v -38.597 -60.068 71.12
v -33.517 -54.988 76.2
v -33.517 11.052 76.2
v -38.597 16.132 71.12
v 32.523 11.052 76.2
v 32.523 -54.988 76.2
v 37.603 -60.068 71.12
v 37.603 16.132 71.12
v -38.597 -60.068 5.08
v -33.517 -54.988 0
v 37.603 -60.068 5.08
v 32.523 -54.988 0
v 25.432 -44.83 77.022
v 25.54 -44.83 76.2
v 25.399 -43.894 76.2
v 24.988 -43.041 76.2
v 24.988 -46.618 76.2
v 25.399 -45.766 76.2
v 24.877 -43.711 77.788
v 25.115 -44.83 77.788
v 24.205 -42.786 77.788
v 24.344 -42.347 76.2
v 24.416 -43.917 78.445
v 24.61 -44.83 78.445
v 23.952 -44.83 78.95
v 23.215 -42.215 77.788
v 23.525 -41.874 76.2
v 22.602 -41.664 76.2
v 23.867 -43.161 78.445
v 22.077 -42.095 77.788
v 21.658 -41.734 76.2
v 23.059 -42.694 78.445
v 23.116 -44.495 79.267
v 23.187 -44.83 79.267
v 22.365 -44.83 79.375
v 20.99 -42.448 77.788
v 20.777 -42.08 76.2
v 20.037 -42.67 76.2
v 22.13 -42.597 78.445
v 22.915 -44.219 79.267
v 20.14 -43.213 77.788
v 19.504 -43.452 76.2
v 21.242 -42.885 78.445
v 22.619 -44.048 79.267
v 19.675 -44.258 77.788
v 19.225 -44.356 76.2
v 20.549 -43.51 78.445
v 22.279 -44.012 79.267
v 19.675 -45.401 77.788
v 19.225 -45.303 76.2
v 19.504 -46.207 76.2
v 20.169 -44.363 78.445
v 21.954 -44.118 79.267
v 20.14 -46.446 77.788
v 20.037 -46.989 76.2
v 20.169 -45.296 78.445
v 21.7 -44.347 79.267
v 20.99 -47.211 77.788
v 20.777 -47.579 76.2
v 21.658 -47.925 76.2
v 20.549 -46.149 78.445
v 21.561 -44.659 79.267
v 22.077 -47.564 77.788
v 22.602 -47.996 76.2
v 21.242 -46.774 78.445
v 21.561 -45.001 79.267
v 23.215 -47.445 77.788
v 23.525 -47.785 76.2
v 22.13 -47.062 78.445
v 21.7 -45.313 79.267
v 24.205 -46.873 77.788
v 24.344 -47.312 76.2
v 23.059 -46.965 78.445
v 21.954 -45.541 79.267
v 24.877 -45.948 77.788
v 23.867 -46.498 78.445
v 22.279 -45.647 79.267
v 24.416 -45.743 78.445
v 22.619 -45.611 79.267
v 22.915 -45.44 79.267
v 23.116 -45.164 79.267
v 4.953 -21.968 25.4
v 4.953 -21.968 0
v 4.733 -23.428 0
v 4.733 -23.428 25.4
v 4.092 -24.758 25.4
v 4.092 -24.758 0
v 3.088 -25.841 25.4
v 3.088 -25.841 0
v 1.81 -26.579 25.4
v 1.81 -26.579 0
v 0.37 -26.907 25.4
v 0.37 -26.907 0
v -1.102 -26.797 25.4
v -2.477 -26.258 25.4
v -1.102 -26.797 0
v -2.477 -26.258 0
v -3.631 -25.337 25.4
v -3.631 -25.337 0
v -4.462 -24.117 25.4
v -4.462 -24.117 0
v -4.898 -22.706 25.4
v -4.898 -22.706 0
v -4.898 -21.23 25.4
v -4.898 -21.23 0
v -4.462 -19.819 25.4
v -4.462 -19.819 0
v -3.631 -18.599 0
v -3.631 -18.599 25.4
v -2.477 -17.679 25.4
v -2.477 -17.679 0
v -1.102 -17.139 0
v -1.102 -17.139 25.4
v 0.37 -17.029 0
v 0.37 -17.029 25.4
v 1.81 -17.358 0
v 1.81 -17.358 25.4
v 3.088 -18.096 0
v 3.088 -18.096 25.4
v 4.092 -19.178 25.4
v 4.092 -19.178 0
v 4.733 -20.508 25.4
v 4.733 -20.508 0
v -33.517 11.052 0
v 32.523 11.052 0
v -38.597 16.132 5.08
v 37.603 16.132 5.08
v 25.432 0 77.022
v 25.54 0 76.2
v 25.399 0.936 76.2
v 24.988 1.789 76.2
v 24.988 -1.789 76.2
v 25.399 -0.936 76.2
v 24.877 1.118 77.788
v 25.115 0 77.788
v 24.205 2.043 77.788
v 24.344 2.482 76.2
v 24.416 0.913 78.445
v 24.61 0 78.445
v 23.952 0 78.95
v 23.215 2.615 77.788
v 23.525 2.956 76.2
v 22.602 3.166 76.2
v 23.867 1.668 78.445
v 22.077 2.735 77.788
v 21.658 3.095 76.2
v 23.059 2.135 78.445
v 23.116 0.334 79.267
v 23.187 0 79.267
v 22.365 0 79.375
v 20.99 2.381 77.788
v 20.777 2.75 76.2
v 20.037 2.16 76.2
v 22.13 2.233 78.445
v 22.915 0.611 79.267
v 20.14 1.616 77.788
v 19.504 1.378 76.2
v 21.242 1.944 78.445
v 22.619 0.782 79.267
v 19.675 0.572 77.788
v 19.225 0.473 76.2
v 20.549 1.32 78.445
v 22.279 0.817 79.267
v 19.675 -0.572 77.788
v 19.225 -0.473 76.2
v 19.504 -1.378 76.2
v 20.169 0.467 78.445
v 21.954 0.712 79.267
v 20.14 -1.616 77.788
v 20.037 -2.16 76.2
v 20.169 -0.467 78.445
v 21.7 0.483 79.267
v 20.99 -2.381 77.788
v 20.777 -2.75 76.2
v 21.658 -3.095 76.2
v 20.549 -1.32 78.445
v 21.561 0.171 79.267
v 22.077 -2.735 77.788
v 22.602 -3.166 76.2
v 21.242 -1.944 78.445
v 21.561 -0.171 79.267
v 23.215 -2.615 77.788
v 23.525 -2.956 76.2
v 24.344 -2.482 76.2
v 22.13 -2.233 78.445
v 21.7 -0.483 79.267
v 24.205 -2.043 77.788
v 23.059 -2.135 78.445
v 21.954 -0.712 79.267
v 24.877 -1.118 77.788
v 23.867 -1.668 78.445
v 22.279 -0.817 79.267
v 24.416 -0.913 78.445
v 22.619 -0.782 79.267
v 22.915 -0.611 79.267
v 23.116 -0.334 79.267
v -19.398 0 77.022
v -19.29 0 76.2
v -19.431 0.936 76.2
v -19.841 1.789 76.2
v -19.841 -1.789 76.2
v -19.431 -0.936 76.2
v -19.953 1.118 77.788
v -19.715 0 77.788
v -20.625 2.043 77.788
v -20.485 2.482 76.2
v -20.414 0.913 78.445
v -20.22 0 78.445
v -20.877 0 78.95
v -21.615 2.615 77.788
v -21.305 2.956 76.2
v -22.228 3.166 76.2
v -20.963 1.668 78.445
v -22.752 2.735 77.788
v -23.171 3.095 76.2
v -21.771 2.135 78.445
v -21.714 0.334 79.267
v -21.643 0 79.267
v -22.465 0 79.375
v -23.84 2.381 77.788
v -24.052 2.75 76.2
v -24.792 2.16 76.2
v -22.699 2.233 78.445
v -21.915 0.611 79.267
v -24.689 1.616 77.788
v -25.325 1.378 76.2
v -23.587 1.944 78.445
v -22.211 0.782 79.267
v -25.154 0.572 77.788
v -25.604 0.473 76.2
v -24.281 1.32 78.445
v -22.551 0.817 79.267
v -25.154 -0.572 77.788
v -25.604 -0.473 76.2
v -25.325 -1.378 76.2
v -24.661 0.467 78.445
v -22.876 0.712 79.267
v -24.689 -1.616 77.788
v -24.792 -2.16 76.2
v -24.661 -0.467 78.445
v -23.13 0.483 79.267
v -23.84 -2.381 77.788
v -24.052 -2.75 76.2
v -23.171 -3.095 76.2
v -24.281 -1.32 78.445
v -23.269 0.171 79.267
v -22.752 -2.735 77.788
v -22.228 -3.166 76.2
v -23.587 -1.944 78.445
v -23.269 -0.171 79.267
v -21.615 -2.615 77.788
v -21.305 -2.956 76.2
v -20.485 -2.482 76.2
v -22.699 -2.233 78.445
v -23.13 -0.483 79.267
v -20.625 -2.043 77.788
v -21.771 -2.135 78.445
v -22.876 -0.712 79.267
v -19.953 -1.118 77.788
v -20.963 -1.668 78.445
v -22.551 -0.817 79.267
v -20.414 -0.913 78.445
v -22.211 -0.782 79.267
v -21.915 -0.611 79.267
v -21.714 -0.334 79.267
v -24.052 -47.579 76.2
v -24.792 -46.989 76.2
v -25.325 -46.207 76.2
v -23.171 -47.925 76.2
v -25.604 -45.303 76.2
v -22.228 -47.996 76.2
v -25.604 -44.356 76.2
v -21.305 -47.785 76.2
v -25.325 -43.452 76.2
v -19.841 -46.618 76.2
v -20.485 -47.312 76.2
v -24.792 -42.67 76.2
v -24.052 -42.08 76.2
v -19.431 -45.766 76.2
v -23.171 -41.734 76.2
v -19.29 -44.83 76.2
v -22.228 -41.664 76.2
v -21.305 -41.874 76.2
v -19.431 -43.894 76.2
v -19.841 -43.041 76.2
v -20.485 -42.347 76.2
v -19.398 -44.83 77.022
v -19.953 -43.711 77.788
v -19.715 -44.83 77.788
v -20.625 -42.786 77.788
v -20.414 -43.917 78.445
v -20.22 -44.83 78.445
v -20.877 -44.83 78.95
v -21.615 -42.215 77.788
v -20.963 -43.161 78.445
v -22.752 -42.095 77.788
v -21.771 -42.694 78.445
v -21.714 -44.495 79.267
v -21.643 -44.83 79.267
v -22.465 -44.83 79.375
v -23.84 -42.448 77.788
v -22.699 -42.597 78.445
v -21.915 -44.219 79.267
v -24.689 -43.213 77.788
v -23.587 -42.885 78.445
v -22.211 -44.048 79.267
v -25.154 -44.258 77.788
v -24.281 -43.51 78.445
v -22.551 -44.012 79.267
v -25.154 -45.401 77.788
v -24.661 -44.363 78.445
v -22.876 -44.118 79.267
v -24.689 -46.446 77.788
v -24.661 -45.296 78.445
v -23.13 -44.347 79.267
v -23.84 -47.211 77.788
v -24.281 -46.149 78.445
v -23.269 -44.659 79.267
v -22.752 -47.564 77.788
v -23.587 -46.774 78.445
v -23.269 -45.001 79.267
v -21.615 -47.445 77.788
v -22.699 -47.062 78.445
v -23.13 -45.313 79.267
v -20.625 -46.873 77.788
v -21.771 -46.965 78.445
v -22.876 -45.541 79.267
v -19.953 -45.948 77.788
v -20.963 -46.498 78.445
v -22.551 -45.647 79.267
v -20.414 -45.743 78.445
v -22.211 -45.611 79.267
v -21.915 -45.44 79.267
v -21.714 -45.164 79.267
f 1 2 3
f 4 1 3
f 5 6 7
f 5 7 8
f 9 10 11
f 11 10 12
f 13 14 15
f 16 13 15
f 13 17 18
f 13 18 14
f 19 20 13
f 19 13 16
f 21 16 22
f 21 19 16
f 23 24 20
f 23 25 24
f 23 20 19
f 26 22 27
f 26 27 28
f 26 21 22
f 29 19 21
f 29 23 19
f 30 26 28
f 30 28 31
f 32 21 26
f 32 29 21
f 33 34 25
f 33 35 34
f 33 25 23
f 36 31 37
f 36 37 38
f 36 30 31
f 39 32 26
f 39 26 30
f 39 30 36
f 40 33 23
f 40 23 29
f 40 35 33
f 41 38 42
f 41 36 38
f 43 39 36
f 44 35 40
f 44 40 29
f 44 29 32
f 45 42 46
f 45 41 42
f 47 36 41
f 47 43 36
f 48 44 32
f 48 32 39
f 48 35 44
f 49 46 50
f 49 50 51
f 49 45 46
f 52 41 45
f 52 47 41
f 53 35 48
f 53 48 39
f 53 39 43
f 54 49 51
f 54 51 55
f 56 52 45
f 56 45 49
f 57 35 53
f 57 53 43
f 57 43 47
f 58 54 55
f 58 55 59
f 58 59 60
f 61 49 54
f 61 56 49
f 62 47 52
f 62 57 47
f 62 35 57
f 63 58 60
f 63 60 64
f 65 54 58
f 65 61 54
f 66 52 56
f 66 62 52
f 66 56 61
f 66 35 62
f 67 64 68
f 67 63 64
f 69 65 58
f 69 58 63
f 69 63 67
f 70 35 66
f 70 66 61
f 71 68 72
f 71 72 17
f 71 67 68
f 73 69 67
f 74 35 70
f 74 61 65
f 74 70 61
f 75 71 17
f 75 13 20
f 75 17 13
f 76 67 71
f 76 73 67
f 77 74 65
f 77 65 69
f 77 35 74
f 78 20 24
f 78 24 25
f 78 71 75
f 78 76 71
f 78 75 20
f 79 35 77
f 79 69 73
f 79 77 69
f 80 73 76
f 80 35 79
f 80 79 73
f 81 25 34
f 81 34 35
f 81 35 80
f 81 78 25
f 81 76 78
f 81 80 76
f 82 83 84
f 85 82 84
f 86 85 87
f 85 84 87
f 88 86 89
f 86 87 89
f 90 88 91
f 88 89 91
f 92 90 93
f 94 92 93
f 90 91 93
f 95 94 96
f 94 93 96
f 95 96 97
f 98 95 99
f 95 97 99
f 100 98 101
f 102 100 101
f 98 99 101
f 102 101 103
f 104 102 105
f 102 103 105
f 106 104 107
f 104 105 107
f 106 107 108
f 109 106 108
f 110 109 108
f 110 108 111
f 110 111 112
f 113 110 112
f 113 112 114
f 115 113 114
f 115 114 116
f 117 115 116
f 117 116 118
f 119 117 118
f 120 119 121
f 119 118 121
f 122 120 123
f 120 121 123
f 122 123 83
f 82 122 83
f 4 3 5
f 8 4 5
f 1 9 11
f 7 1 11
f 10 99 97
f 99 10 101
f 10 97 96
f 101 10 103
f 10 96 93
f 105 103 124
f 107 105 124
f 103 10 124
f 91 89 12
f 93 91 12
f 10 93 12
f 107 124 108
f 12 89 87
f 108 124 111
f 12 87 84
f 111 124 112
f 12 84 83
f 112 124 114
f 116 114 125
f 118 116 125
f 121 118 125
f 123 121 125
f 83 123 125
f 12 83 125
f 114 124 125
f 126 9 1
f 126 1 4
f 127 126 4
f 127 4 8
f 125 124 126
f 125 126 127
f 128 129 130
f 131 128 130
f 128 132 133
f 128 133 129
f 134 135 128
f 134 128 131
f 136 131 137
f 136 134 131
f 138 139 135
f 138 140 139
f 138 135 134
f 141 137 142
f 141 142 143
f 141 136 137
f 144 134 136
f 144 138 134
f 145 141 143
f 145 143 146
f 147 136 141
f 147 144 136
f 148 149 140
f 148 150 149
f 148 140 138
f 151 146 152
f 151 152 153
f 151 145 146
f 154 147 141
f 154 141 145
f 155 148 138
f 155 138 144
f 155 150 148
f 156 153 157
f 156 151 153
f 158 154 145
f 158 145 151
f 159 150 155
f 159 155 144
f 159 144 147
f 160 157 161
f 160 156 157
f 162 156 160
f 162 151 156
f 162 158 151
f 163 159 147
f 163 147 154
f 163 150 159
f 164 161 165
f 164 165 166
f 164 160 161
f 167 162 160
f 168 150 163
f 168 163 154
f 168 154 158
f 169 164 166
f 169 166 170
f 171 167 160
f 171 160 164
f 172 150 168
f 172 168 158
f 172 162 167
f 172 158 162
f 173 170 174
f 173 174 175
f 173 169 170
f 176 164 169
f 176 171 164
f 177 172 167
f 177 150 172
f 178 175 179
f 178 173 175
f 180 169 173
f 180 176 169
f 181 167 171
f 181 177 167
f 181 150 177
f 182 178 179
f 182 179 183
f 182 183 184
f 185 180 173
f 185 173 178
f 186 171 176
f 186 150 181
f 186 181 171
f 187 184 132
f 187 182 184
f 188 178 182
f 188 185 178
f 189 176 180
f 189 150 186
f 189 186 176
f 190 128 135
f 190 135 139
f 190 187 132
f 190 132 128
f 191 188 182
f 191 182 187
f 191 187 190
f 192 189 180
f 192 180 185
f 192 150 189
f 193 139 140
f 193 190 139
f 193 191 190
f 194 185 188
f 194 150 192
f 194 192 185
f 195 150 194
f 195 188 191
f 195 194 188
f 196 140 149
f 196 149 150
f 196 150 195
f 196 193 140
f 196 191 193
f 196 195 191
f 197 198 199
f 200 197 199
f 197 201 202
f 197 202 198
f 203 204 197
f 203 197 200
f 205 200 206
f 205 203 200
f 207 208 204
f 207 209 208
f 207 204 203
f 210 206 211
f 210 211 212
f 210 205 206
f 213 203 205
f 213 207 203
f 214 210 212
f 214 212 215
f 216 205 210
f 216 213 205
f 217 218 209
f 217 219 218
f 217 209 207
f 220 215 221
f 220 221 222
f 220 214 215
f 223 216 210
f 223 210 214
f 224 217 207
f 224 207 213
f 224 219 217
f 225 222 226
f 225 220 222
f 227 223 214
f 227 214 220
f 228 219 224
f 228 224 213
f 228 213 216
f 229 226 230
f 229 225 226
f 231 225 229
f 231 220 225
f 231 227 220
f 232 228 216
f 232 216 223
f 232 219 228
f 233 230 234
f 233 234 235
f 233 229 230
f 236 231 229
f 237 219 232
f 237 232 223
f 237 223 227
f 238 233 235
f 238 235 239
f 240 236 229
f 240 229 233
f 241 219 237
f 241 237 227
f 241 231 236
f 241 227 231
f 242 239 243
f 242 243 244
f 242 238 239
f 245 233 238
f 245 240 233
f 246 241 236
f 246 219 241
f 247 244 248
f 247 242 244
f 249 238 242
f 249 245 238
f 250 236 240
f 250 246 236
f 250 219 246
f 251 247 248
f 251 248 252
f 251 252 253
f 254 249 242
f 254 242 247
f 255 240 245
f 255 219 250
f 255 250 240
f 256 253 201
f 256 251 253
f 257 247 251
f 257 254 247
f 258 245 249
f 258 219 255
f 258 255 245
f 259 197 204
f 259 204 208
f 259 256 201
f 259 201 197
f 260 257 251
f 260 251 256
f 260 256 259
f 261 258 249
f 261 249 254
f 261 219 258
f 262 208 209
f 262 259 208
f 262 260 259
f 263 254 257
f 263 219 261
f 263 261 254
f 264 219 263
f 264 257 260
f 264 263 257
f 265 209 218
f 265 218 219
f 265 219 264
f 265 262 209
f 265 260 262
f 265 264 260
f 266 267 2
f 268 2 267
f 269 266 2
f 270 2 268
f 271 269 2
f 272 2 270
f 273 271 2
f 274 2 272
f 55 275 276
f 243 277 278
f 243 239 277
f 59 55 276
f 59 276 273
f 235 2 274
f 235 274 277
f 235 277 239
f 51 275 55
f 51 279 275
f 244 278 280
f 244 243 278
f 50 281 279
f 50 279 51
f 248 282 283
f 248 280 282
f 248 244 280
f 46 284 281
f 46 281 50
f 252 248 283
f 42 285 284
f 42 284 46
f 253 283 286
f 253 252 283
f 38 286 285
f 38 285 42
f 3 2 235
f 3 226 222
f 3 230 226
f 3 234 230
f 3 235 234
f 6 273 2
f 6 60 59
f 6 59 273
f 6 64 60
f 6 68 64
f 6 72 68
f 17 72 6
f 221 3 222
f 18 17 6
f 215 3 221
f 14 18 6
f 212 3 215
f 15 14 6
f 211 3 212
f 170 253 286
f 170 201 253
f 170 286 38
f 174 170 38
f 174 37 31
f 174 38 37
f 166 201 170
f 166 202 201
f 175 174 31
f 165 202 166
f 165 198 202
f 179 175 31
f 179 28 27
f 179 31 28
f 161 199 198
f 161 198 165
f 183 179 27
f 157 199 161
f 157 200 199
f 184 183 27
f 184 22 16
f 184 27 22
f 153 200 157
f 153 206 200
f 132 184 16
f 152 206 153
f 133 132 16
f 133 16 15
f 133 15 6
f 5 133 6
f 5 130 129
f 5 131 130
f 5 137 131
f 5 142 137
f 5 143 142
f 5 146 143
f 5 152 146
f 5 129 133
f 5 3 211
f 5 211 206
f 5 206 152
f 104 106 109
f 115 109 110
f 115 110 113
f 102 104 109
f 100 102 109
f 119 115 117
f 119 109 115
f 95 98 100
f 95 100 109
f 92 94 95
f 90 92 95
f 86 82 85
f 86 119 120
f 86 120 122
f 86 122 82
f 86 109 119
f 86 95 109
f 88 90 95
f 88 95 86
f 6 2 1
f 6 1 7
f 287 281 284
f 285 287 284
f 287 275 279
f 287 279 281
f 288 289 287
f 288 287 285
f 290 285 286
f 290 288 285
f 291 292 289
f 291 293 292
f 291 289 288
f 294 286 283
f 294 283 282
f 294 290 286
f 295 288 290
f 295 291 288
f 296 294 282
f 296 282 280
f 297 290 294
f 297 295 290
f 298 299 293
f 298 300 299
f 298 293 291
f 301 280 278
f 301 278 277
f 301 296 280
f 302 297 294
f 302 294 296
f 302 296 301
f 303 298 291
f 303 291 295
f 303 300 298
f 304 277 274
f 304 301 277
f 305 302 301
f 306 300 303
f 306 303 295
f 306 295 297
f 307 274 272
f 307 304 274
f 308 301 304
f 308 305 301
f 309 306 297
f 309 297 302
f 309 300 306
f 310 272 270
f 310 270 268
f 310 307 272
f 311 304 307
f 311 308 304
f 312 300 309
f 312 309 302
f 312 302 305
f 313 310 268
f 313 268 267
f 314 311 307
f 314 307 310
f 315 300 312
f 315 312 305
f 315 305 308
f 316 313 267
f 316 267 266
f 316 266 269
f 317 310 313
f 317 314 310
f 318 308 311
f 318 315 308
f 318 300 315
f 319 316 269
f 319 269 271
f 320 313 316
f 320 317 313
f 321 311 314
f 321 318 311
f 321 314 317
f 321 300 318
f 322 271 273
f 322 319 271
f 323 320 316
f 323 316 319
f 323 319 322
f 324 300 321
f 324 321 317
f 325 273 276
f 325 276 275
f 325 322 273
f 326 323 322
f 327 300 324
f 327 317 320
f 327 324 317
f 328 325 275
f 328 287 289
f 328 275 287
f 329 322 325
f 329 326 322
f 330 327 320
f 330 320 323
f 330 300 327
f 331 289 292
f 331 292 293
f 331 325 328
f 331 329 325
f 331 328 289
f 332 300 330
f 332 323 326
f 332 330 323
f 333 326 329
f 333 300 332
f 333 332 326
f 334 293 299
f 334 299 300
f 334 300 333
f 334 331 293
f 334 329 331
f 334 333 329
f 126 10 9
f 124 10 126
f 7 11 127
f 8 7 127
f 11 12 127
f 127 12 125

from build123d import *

# Parameters (mm, degrees)
F0_W     = 76.2
F0_H     = 76.2
F1_DEPTH = 76.2
F2_SIZE  = 5.08
F3_R     = 4.953
F4_DEPTH = 25.4
F5_R     = 3.175
F6_DEPTH = 3.175
F7_R     = 3.17499


# Not quite as in the source:
# - a fillet or chamfer is up to 0.001 mm smaller than in the source, because OpenCascade refuses the exact size


with BuildPart() as f1:
    # F0 (on Top) → F1 (new body)
    with BuildSketch(Plane.XY):
        with Locations((-0.4966171047, -21.9681663439)):
            Rectangle(F0_W, F0_H)
    extrude(amount=F1_DEPTH)

    # F2
    f2_edges = [f1.edges().sort_by_distance(p)[0] for p in [
        (-0.496617, -60.068166, 76.2),
        (37.603383, -21.968166, 76.2),
        (-0.496617, 16.131834, 76.2),
        (-38.596617, -21.968166, 76.2),
        (37.603383, -21.968166, 0),
        (-0.496617, -60.068166, 0),
        (-38.596617, -21.968166, 0),
        (-0.496617, 16.131834, 0),
    ]]
    chamfer(f2_edges, length=F2_SIZE)

    # F3 (on face) → F4 (cut)
    with BuildSketch(Plane(origin=(0, 0, 0), x_dir=(1, 0, 0), z_dir=(0, 0, -1))):
        with Locations((0, 21.9681663439)):
            Circle(F3_R)
    extrude(amount=-F4_DEPTH, mode=Mode.SUBTRACT)

    # F5 (on face) → F6 (join)
    with BuildSketch(Plane.XY.offset(76.2)):
        with Locations((-22.4647834486, 0)):
            Circle(F5_R)
        with Locations((22.3648820278, 0)):
            Circle(F5_R)
        with Locations((-22.4647834486, -44.8296654764)):
            Circle(F5_R)
        with Locations((22.3648820278, -44.8296654764)):
            Circle(F5_R)
    extrude(amount=F6_DEPTH)

    # F7 (radius 3.175 in the source; OpenCascade refuses exactly that, so slightly less here)
    f7_edges = [f1.edges().sort_by_distance(p)[0] for p in [
        (-25.639783, -44.829665, 79.375),
        (-25.639783, 0, 79.375),
        (19.189882, 0, 79.375),
        (19.189882, -44.829665, 79.375),
    ]]
    fillet(f7_edges, radius=F7_R)


solid = f1.part
